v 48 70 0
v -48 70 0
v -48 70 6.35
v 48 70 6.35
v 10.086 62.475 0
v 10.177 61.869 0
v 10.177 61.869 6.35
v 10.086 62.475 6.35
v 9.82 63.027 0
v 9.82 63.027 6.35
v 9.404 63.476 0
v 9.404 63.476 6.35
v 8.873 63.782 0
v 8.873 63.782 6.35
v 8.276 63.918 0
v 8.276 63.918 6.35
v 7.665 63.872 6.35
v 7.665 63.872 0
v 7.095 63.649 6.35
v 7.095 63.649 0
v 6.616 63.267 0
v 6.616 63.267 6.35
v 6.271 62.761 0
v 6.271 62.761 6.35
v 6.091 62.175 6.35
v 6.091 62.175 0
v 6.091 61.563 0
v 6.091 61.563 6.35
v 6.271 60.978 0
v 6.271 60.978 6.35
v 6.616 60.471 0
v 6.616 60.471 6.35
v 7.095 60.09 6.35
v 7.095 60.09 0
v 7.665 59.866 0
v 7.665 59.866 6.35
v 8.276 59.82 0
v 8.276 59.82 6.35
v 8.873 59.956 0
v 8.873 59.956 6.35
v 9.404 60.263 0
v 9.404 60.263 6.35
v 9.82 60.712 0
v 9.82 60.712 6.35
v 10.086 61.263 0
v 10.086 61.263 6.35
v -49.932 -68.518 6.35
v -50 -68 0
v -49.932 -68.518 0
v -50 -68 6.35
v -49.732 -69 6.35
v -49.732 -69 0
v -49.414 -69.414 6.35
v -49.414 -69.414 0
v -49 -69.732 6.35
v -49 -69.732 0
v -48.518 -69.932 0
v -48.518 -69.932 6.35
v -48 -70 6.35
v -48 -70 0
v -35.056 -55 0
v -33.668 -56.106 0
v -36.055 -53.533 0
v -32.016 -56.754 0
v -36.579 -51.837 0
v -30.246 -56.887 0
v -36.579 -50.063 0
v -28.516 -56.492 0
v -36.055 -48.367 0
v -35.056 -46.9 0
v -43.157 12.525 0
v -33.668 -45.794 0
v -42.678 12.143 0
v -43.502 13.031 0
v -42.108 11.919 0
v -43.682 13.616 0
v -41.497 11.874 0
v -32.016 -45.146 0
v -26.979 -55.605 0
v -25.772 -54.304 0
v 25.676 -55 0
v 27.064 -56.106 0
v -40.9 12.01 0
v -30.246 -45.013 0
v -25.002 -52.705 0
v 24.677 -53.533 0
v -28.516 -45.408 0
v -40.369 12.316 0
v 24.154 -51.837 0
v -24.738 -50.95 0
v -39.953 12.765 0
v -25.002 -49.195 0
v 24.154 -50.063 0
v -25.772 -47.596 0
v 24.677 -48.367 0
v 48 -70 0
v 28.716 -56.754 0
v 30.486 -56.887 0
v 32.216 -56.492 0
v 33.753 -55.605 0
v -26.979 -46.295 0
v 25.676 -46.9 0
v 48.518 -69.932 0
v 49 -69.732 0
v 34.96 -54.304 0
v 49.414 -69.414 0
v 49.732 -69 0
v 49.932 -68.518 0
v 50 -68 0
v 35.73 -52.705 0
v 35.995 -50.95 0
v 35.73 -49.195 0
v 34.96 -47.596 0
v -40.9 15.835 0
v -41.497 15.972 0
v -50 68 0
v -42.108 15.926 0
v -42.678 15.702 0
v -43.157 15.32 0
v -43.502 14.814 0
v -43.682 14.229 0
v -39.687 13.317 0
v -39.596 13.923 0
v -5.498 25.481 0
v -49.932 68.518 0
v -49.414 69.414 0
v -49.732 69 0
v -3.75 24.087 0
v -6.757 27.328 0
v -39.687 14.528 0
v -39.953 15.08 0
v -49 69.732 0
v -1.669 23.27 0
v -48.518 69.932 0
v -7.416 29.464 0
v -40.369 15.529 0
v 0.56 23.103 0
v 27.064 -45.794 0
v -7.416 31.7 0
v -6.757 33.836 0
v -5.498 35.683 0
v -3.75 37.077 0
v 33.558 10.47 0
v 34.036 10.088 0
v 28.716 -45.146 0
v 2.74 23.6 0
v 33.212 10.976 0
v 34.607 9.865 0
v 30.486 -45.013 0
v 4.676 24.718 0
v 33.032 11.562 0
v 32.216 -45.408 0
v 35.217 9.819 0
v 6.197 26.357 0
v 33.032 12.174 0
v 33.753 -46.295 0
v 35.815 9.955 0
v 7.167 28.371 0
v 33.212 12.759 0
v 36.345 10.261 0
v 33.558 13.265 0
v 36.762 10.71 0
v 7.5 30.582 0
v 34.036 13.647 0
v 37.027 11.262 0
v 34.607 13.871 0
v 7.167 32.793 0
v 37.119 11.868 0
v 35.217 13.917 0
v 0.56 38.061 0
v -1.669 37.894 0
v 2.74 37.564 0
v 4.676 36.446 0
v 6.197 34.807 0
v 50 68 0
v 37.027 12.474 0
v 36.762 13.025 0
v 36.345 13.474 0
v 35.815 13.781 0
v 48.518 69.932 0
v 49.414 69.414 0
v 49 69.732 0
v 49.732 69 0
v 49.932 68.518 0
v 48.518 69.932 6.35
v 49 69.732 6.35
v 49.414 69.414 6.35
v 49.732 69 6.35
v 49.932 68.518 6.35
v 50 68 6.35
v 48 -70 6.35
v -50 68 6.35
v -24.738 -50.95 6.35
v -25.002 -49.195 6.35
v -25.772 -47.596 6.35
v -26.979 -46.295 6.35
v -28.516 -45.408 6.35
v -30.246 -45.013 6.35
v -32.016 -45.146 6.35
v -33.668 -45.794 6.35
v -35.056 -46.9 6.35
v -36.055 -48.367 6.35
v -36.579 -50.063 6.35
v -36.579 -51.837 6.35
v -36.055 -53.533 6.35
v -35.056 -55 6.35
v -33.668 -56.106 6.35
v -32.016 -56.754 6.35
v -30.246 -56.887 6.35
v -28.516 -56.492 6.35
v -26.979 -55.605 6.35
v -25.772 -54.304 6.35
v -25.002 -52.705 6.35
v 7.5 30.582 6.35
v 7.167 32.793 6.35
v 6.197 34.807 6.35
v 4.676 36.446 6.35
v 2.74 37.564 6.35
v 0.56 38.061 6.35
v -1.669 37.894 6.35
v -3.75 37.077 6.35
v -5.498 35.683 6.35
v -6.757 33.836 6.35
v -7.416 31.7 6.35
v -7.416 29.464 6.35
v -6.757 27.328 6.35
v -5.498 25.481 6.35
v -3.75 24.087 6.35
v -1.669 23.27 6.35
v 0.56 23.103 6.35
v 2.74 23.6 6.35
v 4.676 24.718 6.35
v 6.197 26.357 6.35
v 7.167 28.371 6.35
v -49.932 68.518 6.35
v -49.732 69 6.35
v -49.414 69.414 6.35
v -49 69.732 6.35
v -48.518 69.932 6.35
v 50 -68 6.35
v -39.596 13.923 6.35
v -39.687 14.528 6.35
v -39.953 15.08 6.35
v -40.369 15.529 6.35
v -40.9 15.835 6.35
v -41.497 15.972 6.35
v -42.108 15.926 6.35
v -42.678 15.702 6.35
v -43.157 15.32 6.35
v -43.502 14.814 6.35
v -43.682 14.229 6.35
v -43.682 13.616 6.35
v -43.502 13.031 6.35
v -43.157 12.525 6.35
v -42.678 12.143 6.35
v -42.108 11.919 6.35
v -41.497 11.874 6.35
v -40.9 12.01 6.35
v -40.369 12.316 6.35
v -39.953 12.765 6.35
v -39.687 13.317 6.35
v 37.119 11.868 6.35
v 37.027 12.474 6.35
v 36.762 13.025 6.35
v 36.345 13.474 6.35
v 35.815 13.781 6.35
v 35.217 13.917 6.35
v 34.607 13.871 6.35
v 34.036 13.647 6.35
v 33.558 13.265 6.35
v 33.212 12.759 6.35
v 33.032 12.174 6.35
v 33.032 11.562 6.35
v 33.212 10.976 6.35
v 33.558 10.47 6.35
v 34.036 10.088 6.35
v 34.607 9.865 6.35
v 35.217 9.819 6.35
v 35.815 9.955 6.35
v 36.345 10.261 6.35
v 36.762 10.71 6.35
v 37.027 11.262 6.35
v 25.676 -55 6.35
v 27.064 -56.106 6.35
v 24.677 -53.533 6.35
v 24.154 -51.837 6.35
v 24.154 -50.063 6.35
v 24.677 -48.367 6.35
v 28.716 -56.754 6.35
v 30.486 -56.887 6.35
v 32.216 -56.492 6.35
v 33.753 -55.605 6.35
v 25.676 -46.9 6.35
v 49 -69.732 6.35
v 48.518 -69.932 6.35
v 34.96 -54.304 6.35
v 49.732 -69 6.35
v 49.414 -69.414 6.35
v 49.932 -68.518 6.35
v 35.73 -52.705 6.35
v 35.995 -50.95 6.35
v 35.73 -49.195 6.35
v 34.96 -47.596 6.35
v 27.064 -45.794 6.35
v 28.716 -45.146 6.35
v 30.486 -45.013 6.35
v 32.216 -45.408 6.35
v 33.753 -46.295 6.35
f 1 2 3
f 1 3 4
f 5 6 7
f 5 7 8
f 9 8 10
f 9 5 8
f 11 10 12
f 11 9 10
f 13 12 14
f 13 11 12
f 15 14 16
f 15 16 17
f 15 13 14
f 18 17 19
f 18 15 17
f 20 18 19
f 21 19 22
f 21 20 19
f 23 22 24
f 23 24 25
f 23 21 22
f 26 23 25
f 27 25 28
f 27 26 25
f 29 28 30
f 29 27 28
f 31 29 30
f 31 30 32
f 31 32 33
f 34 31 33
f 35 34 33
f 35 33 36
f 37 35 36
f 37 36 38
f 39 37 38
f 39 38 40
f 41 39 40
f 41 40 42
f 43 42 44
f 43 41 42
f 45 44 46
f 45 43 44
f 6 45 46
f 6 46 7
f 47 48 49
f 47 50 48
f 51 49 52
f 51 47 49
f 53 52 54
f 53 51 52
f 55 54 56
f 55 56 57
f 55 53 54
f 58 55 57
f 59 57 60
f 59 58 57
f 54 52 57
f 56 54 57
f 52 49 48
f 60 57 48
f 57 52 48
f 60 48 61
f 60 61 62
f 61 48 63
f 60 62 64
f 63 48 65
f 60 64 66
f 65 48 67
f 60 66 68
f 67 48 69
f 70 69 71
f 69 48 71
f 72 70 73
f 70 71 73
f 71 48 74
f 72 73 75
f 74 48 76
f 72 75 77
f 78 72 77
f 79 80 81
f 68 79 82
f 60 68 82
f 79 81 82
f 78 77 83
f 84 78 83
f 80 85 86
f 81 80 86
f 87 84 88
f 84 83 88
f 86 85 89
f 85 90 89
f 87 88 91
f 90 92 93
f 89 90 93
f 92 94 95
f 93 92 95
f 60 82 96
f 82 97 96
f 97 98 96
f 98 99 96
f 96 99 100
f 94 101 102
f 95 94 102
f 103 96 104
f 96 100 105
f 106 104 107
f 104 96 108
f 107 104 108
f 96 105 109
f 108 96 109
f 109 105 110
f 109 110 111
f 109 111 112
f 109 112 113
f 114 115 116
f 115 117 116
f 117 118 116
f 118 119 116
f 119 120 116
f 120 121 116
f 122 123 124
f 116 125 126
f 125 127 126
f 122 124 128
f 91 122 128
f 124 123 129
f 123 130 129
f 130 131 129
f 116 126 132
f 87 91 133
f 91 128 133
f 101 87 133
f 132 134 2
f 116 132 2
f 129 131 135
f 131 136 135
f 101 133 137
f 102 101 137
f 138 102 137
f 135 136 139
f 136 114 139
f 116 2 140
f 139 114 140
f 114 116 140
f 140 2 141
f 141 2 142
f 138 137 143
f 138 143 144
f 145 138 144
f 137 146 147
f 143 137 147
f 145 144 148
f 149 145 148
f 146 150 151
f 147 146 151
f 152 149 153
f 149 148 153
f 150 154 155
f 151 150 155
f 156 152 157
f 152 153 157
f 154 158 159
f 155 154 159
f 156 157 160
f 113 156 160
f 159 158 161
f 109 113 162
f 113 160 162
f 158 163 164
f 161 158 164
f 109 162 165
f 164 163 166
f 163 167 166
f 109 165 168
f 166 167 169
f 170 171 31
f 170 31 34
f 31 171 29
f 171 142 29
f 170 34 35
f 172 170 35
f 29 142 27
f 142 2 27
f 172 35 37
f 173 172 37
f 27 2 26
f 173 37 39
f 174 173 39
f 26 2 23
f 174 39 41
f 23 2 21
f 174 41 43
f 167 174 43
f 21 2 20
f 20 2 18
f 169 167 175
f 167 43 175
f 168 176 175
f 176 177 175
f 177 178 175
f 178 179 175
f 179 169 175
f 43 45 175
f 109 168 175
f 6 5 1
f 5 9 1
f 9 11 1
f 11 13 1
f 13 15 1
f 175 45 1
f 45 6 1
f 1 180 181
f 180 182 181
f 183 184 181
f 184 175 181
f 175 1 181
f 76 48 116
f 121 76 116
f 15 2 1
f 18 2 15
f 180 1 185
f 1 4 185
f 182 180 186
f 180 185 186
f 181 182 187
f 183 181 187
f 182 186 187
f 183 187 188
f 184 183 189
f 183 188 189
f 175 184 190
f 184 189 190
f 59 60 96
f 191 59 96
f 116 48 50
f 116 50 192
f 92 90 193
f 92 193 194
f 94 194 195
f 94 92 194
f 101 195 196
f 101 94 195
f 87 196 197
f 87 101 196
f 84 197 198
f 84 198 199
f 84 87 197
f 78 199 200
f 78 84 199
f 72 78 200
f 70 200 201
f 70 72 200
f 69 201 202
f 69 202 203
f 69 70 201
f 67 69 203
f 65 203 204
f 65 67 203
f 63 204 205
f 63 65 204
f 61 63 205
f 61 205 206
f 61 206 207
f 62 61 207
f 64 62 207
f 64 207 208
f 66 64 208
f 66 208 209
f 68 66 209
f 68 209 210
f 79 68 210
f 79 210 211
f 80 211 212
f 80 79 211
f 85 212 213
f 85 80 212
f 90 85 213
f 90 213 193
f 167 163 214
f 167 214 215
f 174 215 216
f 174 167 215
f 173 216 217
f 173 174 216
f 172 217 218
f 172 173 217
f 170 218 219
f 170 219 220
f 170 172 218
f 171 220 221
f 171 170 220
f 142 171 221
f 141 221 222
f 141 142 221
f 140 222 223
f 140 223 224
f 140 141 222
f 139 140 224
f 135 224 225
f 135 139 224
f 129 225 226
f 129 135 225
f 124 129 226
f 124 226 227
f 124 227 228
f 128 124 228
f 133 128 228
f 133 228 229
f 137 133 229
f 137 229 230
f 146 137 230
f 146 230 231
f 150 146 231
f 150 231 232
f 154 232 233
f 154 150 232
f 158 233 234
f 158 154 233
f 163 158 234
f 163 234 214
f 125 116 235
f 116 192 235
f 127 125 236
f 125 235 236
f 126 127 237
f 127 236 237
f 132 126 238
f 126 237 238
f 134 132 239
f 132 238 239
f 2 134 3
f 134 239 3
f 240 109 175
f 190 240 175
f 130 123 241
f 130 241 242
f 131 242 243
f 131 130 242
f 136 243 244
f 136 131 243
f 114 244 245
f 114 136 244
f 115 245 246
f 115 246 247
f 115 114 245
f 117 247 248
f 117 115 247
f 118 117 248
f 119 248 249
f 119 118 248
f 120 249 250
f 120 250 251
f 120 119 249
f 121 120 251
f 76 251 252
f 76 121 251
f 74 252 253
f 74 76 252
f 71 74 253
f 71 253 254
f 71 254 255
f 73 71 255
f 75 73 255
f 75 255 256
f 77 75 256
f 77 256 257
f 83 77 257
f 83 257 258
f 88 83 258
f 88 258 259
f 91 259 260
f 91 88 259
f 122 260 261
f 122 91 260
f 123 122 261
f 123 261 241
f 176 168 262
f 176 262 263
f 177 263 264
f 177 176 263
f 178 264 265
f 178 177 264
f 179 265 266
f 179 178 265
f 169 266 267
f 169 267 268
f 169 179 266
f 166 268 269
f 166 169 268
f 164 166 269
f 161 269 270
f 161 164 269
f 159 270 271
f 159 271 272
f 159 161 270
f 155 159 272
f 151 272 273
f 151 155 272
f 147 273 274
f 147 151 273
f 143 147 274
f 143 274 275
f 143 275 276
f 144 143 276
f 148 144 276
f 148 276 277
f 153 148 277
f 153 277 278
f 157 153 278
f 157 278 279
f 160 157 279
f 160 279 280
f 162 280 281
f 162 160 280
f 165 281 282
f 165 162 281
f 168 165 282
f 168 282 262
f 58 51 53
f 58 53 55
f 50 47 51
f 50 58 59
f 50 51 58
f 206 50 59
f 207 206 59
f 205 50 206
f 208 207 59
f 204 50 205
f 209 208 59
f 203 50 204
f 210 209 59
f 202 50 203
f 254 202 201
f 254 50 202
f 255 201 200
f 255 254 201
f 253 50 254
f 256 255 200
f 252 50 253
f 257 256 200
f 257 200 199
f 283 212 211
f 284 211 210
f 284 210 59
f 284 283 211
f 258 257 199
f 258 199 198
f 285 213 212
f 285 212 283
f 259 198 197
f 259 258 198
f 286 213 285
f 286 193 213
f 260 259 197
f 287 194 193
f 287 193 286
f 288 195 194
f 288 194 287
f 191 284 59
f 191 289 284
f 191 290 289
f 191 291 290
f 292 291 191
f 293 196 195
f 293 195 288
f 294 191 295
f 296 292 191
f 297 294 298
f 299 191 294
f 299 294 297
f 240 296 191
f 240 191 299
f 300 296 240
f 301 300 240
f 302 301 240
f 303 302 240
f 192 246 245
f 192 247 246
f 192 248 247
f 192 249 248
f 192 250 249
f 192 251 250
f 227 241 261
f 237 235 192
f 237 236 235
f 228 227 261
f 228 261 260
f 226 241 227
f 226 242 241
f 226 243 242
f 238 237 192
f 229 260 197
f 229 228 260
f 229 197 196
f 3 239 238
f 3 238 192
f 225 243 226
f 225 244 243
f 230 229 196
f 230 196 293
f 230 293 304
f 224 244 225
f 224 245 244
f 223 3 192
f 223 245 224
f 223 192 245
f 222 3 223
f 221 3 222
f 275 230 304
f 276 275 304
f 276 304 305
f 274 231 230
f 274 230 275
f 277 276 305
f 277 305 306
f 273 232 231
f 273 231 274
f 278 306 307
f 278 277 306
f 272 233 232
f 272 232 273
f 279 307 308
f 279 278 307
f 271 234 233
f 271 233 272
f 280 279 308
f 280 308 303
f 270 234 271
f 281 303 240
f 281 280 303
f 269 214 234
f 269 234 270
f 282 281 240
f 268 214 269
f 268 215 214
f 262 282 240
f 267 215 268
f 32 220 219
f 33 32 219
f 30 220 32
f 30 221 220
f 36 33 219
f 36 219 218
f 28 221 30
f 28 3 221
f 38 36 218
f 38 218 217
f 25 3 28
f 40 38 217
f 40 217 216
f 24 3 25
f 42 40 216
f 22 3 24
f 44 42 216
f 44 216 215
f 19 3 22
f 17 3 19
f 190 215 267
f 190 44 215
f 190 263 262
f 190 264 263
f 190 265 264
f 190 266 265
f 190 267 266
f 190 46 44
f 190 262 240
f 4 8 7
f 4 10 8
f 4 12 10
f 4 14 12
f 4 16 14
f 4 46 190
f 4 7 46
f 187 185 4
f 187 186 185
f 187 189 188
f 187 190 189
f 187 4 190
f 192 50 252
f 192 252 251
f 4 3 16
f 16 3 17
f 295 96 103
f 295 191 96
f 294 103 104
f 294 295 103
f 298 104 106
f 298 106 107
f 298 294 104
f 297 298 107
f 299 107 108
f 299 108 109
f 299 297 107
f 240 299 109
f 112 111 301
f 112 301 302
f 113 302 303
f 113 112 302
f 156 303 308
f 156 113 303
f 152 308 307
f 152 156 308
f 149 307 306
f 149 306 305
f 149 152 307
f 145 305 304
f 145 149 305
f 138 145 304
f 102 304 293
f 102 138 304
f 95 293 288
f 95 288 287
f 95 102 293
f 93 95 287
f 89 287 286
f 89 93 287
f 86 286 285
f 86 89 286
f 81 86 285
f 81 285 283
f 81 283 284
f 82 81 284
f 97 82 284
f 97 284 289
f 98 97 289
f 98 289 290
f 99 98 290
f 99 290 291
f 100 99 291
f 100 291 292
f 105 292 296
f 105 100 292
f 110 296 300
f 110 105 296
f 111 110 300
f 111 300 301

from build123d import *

# Parameters (mm, degrees)
SKETCH1_W           = 100
SKETCH1_H           = 140
SKETCH1_R           = 5.953762401
SKETCH1_R_2         = 2.054847291
SKETCH1_R_3         = 7.5
BOSS_EXTRUDE1_DEPTH = 6.35
FILLET1_R           = 2


with BuildPart() as part:
    # Sketch1 → Boss-Extrude1 (new body)
    with BuildSketch(Plane.XY):
        Rectangle(SKETCH1_W, SKETCH1_H)
        with Locations((-30.691299308, -50.95)):
            Circle(SKETCH1_R, mode=Mode.SUBTRACT)
        with Locations((30.040853965, -50.95)):
            Circle(SKETCH1_R, mode=Mode.SUBTRACT)
        with Locations((-41.650484861, 13.92267898)):
            Circle(SKETCH1_R_2, mode=Mode.SUBTRACT)
        with Locations((8.122482859, 61.869115774)):
            Circle(SKETCH1_R_2, mode=Mode.SUBTRACT)
        with Locations((35.06381401, 11.867831689)):
            Circle(SKETCH1_R_2, mode=Mode.SUBTRACT)
        with Locations((0, 30.582009883)):
            Circle(SKETCH1_R_3, mode=Mode.SUBTRACT)
    extrude(amount=BOSS_EXTRUDE1_DEPTH)

    # Fillet1
    fillet1_edges = [part.edges().sort_by_distance(p)[0] for p in [
        (50, -70, 3.175),
        (-50, -70, 3.175),
        (-50, 70, 3.175),
        (50, 70, 3.175),
    ]]
    fillet(fillet1_edges, radius=FILLET1_R)


solid = part.part
